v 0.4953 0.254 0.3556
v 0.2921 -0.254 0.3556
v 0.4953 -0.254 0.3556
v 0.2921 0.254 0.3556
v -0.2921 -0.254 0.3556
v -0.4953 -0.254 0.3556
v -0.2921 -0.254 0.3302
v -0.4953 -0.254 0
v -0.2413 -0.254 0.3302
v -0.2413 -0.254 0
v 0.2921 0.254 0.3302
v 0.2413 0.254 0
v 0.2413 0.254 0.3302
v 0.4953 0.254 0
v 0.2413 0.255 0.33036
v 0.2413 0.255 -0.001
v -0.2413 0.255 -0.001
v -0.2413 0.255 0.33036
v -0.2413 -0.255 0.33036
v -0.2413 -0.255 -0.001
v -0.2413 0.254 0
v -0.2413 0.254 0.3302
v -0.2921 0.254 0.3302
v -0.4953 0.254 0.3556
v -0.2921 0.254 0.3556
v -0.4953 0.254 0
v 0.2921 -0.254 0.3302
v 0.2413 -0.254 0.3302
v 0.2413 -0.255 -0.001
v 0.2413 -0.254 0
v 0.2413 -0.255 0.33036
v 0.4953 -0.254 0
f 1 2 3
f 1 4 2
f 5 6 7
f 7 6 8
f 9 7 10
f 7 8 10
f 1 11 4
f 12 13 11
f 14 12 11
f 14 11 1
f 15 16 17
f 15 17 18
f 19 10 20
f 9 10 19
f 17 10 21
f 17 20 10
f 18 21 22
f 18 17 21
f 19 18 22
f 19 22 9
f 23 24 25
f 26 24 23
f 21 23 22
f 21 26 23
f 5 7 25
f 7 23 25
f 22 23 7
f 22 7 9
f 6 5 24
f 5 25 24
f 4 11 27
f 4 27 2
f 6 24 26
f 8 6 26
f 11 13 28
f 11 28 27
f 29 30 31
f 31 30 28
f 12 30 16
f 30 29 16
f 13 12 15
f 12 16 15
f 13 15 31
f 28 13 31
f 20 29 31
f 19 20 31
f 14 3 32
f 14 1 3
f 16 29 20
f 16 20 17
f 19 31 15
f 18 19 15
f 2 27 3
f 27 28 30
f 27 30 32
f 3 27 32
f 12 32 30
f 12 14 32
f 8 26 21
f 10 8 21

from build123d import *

# Parameters (mm, degrees)
BOSS_EXTRUDE1_DEPTH   = 0.254
BOSS_EXTRUDE1_2_DEPTH = 0.254
SKETCH3_W             = 0.9398
SKETCH3_H             = 0.3048
BOSS_EXTRUDE2_DEPTH   = 0.508
SKETCH4_W             = 0.331359425
SKETCH4_H             = 0.51
BOSS_EXTRUDE3_DEPTH   = 0.4826


with BuildPart() as part:
    # Sketch2 → Boss-Extrude1 (new body, symmetric)
    with BuildSketch(Plane(origin=(0, 0, 0), x_dir=(0, 0, -1), z_dir=(0, 1, 0))):
        Polygon((0, 0.2413), (-0.0254, 0.2413), (-0.0254, 0.4699), (-0.3302, 0.4699), (-0.3302, 0.2921), (-0.3556, 0.2921), (-0.3556, 0.4953), (0, 0.4953), align=None)
    extrude(amount=BOSS_EXTRUDE1_DEPTH, both=True)



with BuildPart() as body_2:
    # Sketch2 → Boss-Extrude1 2 (new body, symmetric)
    with BuildSketch(Plane(origin=(0, 0, 0), x_dir=(0, 0, -1), z_dir=(0, 1, 0))):
        Polygon((0, -0.4953), (0, -0.2413), (-0.0254, -0.2413), (-0.0254, -0.4699), (-0.3302, -0.4699), (-0.3302, -0.2921), (-0.3556, -0.2921), (-0.3556, -0.4953), align=None)
    extrude(amount=BOSS_EXTRUDE1_2_DEPTH, both=True)


with BuildPart() as part_1:
    add(part.part)

    add(body_2.part)  # Boss-Extrude2 merges body 2
    # Sketch3 → Boss-Extrude2 (add)
    with BuildSketch(Plane(origin=(0, 0.254, 0), x_dir=(1, 0, 0), z_dir=(0, 1, 0))):
        with Locations((0, -0.1778)):
            Rectangle(SKETCH3_W, SKETCH3_H)
    extrude(amount=-BOSS_EXTRUDE2_DEPTH)

    # Sketch4 → Boss-Extrude3 (add)
    with BuildSketch(Plane.ZY.offset(-0.2413)):
        with Locations((0.164679713, 0)):
            Rectangle(SKETCH4_W, SKETCH4_H)
    extrude(amount=BOSS_EXTRUDE3_DEPTH)


solid = part_1.part
